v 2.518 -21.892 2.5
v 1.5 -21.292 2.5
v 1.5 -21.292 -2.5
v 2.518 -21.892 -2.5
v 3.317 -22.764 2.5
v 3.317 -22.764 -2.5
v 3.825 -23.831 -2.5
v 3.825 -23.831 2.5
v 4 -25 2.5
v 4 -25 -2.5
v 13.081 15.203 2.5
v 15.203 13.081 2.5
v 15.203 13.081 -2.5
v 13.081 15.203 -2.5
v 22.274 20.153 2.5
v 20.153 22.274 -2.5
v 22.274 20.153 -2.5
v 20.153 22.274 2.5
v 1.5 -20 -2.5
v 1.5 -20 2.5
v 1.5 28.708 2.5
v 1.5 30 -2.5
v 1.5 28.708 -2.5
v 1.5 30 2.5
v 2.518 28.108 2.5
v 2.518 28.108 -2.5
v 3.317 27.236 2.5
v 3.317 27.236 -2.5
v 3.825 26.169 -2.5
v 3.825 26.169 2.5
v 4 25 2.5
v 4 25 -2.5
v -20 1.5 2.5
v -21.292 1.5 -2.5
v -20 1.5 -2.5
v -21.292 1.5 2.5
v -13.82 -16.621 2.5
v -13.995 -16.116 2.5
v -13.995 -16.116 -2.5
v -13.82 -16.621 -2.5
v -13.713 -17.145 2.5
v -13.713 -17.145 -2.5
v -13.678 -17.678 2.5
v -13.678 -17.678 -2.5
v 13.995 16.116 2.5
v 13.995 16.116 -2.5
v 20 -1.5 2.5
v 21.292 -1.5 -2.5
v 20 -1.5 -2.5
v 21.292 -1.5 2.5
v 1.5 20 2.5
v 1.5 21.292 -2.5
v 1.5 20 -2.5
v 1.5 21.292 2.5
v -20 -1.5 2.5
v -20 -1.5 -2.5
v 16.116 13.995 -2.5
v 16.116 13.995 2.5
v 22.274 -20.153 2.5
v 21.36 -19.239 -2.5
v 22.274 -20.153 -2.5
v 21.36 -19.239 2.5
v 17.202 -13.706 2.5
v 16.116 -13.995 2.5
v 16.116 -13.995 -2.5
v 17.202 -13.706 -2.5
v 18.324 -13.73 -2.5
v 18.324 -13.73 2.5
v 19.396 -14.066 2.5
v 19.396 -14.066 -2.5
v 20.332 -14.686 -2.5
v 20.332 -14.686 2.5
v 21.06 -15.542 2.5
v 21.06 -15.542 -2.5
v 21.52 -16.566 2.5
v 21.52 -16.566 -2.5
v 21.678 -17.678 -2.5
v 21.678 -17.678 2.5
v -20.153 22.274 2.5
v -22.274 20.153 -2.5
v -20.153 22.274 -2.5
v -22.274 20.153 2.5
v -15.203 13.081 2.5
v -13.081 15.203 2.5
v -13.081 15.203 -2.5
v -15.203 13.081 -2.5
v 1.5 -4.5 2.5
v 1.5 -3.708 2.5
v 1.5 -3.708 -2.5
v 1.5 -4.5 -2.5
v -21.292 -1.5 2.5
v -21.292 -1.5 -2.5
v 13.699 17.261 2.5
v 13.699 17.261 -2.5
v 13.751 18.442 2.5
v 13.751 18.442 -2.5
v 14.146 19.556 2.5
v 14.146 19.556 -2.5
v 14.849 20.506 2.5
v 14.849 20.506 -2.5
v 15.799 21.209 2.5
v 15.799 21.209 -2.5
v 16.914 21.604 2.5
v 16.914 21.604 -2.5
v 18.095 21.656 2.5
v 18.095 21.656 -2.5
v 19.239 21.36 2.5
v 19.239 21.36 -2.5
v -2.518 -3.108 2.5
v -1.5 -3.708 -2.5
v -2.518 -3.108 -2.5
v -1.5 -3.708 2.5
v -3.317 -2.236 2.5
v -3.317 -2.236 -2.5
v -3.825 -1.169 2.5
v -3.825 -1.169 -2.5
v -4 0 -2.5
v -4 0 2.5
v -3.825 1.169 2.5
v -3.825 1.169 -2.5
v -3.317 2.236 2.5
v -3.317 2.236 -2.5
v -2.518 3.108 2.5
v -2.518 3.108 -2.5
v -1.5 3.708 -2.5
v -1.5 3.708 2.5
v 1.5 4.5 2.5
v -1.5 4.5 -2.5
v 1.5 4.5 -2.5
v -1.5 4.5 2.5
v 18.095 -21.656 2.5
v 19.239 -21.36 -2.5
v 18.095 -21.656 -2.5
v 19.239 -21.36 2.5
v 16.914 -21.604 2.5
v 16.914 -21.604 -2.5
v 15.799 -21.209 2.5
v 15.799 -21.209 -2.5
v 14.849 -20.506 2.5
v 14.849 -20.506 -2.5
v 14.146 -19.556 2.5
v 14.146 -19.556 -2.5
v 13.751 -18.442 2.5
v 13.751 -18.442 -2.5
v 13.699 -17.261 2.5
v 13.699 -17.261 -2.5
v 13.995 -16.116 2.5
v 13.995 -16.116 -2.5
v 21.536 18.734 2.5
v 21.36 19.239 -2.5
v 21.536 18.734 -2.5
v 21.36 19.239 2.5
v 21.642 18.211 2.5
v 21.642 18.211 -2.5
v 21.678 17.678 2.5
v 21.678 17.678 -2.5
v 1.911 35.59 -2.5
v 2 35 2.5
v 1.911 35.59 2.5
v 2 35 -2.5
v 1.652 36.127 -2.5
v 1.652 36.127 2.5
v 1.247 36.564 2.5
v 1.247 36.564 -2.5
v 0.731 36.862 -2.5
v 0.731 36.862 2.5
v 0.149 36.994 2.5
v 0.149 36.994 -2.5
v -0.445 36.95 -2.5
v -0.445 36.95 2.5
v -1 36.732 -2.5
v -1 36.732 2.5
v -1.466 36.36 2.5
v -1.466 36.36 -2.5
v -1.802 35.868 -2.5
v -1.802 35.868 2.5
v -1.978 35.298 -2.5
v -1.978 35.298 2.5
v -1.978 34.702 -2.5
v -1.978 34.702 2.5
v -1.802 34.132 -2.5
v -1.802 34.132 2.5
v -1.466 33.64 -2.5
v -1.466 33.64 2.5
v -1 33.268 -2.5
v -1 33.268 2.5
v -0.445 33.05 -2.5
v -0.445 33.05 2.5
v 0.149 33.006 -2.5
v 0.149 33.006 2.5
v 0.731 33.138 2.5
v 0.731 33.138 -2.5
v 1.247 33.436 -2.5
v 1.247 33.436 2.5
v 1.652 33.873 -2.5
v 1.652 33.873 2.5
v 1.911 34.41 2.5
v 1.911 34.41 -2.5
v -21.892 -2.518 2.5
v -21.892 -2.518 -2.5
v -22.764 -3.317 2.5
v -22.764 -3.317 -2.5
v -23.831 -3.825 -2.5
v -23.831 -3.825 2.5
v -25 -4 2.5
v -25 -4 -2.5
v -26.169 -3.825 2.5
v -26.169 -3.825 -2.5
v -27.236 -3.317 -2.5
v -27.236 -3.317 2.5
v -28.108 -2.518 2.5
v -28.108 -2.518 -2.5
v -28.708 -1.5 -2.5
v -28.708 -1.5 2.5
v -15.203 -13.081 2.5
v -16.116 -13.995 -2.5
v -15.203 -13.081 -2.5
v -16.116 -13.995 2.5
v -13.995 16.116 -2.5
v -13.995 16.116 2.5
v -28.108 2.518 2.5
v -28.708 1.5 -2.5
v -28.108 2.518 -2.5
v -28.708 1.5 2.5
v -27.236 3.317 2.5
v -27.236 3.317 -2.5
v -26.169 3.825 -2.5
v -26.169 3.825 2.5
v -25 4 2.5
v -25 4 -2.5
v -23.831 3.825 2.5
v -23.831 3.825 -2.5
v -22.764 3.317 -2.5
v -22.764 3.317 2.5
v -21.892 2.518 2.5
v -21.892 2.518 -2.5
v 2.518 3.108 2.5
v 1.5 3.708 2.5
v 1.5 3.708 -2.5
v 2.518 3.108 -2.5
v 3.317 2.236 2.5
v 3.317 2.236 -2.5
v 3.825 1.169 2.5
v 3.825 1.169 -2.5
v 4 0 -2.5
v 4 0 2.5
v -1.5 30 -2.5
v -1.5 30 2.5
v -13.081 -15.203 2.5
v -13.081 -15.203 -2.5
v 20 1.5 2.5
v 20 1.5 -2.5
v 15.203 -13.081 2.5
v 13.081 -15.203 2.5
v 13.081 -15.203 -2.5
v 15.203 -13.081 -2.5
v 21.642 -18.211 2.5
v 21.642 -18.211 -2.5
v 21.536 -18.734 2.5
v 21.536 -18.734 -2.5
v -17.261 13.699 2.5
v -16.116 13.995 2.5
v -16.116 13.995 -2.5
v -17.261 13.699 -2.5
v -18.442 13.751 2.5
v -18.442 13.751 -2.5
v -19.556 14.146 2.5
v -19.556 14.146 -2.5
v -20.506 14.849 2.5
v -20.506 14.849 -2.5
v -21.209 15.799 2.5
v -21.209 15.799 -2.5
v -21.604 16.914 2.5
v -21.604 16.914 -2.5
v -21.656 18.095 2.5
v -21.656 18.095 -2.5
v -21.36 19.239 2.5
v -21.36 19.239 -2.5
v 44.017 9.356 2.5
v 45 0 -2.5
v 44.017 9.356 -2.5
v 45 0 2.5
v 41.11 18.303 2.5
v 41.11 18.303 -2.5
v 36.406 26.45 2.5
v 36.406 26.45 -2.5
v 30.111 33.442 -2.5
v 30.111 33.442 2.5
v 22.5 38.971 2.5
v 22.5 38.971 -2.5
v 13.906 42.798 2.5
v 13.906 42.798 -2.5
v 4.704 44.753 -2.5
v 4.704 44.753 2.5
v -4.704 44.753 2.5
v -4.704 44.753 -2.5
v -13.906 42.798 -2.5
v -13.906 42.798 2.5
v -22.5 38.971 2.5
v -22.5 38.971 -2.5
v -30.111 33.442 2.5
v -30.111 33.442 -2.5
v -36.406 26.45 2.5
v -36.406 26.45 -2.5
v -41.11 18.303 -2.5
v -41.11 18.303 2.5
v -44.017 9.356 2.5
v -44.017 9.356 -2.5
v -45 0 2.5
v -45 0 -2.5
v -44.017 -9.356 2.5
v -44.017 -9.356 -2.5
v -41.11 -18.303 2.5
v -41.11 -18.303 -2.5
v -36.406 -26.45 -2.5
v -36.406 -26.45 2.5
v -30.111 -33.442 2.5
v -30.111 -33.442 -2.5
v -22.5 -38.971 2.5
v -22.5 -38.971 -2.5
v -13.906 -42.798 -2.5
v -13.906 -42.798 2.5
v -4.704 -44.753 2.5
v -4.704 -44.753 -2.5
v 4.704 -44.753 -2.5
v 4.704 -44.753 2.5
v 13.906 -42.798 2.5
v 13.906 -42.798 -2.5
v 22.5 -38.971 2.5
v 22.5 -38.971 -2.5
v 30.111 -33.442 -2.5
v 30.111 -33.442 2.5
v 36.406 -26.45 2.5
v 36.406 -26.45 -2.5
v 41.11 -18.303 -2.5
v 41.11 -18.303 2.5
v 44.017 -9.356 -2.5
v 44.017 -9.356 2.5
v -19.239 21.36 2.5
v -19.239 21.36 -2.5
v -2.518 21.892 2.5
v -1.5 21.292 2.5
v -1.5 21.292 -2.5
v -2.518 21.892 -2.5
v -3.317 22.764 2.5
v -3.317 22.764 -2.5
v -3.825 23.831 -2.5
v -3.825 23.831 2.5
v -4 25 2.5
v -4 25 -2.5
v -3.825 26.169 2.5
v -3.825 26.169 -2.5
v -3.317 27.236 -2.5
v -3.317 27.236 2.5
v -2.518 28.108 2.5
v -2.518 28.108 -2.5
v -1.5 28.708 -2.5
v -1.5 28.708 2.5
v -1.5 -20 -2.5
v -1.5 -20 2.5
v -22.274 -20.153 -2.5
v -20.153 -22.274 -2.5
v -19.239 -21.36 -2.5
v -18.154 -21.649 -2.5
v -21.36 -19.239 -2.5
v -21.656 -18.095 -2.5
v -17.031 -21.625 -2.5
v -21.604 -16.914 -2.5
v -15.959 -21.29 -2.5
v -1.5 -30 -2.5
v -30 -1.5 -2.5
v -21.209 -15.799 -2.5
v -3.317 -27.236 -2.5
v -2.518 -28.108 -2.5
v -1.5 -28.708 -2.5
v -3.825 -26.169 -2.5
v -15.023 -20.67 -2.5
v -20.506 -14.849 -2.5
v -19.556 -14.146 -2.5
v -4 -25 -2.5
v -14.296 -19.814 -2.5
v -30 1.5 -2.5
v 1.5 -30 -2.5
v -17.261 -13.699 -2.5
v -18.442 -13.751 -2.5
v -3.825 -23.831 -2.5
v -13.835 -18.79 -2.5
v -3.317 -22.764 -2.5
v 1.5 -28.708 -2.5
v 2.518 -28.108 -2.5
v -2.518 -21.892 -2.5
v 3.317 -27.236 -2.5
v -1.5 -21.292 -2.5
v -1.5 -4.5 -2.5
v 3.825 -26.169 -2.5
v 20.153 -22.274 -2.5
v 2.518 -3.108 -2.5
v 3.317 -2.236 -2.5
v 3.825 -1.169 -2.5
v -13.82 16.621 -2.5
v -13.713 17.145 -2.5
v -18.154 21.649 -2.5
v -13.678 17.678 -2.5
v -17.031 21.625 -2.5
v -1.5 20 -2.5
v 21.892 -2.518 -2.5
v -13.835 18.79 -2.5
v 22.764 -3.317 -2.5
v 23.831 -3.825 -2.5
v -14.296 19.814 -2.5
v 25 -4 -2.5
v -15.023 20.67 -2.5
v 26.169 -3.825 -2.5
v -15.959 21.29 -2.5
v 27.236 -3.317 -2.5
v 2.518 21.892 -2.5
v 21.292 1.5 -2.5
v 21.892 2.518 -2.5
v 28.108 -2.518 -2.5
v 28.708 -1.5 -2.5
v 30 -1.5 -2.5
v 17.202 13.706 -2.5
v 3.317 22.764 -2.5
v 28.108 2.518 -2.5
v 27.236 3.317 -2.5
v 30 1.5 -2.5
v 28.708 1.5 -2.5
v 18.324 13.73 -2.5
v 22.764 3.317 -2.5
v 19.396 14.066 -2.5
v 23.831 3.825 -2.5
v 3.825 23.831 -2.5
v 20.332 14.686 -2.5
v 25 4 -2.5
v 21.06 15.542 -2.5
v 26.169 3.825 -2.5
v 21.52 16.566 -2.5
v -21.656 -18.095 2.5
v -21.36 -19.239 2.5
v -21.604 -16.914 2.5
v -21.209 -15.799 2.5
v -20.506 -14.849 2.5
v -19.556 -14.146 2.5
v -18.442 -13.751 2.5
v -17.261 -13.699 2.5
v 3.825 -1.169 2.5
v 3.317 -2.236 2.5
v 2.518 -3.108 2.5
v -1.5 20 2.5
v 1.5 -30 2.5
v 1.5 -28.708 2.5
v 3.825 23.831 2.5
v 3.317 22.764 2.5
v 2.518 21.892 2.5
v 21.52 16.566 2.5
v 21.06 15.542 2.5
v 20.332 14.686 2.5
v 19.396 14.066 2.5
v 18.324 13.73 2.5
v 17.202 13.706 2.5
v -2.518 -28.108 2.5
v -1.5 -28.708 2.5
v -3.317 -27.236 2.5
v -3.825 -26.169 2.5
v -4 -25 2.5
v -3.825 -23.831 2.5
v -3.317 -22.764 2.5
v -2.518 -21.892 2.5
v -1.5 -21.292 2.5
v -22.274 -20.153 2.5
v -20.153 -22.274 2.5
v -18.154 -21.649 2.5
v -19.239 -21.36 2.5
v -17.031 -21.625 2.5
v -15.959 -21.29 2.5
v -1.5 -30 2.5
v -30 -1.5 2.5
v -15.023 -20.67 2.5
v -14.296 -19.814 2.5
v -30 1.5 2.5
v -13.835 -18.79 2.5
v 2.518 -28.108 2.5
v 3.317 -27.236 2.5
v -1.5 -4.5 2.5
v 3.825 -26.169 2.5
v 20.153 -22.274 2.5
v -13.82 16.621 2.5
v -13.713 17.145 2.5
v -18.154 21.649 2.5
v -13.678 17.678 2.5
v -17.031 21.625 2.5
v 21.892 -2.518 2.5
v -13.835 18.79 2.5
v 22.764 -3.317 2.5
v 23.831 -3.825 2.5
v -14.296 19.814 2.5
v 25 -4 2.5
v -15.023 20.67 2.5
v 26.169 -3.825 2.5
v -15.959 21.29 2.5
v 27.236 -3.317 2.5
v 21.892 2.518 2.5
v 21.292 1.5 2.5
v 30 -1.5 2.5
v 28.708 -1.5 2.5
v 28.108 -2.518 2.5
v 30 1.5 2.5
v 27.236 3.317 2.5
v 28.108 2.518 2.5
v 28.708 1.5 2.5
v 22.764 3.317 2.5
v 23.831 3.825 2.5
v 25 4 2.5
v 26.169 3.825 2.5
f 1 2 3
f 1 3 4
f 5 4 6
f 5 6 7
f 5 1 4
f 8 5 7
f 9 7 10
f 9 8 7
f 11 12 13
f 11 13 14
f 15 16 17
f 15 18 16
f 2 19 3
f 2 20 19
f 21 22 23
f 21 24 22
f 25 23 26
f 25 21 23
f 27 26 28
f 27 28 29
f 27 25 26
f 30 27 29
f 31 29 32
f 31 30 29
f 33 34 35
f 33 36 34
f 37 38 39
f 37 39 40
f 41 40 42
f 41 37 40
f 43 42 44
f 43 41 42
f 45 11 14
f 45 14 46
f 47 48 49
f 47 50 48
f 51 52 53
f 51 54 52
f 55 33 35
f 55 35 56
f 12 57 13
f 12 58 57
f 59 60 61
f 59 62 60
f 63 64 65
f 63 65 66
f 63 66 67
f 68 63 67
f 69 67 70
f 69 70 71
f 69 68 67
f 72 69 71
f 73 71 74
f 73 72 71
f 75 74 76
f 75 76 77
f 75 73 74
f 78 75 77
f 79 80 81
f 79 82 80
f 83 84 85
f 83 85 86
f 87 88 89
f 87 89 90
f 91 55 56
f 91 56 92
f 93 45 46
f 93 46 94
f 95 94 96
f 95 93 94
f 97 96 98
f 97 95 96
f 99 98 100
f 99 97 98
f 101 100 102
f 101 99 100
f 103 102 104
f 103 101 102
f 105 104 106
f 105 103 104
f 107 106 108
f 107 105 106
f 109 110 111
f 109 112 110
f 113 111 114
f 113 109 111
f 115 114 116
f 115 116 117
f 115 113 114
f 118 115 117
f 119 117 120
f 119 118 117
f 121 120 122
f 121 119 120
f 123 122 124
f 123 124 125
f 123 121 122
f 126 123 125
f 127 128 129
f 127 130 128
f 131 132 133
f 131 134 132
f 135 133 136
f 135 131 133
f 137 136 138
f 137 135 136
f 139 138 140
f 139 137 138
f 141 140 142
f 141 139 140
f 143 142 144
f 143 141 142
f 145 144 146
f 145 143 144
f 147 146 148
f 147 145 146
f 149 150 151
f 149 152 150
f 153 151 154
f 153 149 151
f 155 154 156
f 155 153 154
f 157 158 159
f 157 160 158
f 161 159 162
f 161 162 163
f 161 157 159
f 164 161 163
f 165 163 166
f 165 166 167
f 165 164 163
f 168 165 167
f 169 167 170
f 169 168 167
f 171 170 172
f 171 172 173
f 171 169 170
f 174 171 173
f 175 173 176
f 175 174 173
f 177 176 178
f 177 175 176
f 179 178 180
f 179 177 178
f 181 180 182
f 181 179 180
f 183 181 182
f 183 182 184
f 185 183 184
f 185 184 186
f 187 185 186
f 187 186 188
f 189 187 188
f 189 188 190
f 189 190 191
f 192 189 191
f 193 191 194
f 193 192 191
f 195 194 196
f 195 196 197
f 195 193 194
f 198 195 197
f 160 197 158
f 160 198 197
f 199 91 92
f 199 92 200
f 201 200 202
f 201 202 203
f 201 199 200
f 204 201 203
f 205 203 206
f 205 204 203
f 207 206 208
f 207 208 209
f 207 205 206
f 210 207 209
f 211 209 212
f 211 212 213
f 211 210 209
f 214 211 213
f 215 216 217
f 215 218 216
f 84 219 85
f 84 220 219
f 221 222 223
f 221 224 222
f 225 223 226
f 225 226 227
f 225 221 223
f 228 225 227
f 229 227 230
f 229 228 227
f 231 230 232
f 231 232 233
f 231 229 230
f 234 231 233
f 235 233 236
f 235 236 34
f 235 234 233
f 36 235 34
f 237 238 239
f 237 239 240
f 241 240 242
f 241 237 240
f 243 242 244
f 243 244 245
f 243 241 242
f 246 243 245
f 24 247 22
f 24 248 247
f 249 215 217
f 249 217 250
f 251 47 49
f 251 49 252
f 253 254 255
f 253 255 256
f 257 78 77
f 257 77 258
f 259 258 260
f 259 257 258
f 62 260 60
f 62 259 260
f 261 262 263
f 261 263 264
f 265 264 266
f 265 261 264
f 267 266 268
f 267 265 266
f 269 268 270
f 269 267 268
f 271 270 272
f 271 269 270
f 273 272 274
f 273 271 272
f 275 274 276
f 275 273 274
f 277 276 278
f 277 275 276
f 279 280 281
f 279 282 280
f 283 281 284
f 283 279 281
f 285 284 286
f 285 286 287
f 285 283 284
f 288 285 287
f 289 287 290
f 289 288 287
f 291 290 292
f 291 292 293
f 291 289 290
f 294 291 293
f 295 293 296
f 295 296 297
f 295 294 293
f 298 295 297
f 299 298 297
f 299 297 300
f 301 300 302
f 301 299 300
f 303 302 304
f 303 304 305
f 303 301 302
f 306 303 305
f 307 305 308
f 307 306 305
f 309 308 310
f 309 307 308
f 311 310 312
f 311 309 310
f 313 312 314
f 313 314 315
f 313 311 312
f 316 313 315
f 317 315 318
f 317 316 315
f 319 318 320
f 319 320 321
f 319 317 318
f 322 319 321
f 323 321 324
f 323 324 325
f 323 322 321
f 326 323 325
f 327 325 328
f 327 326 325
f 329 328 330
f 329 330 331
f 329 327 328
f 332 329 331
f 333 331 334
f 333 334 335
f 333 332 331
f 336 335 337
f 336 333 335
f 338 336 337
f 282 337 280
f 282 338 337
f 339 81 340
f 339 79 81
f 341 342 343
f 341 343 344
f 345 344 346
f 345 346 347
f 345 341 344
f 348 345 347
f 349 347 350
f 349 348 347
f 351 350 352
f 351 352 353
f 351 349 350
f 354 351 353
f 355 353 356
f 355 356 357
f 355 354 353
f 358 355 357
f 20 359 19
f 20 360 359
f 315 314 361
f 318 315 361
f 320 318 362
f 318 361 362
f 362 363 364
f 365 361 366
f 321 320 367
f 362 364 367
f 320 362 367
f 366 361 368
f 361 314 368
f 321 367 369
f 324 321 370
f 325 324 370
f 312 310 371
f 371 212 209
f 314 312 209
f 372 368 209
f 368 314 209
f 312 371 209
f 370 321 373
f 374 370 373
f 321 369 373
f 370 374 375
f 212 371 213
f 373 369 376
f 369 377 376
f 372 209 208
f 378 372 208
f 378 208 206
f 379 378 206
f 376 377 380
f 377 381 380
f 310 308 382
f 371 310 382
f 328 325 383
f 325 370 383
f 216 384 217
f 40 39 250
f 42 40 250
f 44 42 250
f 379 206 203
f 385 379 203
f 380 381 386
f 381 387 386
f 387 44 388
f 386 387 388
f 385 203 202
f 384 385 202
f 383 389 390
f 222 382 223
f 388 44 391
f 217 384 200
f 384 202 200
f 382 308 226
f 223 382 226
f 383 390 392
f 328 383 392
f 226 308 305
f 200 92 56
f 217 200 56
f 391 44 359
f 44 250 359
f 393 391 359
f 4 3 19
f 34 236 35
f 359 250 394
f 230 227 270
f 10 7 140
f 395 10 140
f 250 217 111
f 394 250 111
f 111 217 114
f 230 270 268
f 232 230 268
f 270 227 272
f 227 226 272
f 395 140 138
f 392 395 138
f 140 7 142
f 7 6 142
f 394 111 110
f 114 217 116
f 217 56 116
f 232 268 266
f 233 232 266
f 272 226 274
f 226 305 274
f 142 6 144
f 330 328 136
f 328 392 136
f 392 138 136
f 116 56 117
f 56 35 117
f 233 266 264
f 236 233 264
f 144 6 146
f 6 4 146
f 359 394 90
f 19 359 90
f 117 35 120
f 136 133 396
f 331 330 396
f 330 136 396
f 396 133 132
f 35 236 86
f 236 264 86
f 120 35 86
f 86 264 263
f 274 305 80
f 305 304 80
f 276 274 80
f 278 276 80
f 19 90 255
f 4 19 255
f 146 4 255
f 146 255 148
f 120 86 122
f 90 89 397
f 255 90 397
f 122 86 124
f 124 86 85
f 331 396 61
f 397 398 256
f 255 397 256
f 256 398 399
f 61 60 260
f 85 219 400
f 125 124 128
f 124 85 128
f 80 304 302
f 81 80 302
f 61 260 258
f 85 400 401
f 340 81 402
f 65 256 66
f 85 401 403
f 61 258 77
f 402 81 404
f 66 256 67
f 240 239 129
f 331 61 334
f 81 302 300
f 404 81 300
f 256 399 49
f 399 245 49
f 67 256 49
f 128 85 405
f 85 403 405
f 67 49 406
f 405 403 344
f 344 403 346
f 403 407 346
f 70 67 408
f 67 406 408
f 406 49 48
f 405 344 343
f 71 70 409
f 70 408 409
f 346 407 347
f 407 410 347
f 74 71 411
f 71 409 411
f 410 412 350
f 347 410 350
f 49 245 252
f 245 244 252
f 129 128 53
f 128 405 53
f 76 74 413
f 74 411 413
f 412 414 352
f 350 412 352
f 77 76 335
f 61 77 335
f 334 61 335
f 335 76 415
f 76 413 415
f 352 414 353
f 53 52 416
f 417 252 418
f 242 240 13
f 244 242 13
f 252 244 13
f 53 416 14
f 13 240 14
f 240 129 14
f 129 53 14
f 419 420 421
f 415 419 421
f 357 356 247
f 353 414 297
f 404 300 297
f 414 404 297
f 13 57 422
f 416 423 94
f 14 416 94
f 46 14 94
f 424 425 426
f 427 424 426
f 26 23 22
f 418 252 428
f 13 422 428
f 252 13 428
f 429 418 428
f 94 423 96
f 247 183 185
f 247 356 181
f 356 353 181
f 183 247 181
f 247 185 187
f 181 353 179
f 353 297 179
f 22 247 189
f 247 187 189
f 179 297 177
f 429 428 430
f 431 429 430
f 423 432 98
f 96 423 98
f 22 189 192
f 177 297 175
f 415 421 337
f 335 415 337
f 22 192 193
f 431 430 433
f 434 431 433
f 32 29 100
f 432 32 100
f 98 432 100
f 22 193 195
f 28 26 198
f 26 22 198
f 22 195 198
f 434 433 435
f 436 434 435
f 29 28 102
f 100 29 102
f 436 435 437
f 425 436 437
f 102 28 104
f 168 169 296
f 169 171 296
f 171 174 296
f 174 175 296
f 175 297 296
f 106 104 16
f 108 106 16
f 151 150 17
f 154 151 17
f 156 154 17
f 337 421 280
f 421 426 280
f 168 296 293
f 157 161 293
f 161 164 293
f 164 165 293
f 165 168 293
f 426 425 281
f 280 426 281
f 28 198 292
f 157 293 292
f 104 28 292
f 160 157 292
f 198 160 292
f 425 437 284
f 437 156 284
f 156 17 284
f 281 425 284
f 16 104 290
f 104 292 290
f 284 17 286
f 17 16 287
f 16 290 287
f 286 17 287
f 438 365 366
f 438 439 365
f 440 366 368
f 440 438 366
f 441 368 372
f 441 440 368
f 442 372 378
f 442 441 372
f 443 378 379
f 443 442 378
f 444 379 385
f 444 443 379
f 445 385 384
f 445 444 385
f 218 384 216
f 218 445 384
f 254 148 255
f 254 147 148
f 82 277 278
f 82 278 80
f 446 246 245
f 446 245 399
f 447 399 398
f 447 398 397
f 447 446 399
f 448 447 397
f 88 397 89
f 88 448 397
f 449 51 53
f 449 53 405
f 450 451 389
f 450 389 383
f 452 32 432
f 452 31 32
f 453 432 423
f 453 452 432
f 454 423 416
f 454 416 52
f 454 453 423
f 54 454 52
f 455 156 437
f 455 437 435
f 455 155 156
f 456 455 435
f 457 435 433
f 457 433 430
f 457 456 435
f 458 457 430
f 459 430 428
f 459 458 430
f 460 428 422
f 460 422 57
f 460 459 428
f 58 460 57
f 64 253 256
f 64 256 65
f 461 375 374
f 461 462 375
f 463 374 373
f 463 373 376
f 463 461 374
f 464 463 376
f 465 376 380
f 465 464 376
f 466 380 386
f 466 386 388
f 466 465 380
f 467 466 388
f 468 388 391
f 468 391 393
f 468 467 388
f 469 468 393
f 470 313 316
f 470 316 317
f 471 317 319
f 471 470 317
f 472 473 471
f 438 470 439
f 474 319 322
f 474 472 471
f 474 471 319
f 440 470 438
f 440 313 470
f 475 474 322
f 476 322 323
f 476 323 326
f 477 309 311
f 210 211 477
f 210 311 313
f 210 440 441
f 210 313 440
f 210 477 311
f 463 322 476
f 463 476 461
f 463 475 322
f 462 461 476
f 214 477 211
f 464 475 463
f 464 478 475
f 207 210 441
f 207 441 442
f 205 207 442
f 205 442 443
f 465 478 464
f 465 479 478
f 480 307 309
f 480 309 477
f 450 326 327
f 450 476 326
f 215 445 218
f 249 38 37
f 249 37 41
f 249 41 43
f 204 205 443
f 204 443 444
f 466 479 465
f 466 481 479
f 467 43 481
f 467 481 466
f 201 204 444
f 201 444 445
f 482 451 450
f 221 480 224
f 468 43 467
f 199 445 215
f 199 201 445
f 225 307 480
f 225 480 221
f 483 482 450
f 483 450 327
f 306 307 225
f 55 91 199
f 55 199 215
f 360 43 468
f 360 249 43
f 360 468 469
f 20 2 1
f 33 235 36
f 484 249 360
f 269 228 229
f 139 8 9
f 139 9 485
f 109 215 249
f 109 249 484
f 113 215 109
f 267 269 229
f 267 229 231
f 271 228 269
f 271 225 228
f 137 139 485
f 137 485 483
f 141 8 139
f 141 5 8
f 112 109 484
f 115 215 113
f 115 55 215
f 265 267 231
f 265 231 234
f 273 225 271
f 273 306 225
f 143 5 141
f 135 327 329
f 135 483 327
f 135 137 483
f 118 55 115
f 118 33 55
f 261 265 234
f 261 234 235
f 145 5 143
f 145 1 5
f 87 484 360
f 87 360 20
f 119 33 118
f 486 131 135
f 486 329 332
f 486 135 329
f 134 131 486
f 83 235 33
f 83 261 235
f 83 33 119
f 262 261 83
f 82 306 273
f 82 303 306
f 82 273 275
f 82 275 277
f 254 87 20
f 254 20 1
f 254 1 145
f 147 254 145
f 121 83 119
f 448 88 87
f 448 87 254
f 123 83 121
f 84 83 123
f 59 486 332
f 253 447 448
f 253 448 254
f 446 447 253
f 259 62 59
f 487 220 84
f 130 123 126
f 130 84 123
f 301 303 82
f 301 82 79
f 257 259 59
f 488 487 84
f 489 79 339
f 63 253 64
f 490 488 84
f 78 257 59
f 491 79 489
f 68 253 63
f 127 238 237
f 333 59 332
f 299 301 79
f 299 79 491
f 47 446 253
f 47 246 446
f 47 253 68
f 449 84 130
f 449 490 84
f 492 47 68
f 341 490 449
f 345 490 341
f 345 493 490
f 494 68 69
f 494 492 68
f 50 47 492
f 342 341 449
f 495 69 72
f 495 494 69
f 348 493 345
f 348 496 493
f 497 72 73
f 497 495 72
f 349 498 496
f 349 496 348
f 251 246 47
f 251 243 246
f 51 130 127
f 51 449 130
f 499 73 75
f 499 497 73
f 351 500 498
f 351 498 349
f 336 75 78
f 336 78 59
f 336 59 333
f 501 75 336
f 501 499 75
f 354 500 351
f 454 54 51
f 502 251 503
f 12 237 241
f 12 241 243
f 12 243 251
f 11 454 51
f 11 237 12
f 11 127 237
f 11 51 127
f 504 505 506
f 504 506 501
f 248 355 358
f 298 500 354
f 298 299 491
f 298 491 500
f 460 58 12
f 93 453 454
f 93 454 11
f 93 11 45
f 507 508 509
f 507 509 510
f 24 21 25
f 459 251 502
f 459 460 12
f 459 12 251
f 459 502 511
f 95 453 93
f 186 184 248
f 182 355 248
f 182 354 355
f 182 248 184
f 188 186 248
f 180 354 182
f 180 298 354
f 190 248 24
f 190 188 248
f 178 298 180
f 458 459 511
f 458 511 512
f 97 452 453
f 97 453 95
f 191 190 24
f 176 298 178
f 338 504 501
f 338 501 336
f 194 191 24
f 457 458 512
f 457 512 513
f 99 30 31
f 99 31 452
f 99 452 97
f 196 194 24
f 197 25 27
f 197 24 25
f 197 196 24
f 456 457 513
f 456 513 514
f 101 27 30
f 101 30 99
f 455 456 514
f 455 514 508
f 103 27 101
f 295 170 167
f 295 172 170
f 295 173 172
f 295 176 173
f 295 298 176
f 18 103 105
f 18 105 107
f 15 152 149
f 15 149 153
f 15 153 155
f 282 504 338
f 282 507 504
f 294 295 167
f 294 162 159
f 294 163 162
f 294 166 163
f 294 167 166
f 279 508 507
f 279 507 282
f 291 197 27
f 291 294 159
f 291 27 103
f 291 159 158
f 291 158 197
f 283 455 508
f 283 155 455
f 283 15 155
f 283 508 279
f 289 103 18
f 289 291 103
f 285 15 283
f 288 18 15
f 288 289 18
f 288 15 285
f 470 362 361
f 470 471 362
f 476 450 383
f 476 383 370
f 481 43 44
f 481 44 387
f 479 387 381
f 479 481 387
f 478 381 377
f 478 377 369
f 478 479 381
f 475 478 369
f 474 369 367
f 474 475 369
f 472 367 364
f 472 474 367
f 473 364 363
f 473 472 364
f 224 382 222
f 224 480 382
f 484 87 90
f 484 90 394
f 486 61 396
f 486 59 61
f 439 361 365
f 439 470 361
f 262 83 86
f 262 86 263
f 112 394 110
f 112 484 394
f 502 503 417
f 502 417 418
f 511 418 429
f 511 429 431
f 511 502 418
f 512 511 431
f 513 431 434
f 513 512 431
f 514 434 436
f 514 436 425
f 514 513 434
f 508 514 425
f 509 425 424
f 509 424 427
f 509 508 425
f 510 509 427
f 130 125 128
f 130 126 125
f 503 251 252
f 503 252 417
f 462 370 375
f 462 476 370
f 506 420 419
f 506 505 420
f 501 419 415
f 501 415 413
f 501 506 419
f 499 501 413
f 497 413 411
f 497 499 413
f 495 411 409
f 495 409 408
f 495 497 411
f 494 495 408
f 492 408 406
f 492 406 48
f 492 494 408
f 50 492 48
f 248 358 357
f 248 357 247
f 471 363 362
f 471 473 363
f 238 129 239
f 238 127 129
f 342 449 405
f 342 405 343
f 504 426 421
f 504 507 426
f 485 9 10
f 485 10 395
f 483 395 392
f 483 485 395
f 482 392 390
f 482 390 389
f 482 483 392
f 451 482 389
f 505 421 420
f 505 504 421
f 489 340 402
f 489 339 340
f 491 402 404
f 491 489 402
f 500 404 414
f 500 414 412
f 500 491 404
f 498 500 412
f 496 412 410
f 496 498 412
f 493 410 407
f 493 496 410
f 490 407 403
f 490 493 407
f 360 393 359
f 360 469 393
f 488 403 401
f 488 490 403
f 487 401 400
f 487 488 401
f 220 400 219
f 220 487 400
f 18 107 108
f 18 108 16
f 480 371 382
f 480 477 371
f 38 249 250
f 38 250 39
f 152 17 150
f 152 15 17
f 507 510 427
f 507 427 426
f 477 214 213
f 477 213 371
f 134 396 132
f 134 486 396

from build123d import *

# Parameters (mm, degrees)
F0_R     = 45
F0_R_2   = 2
F1_DEPTH = 2.5


with BuildPart() as f1:
    # F0 (on Top) → F1 (new body, symmetric)
    with BuildSketch(Plane.XY):
        Circle(F0_R)
        with BuildLine():
            Line((-15.202796, -13.081475), (-13.081475, -15.202796))
            Line((-13.081475, -15.202796), (-13.994987, -16.116308))
            ThreePointArc((-13.994987, -16.116308), (-13.757802, -16.881029), (-13.67767, -17.67767))
            ThreePointArc((-13.67767, -17.67767), (-15.469214, -21.012744), (-19.239031, -21.360352))
            Line((-19.239031, -21.360352), (-20.152543, -22.273864))
            Line((-20.152543, -22.273864), (-22.273864, -20.152543))
            Line((-22.273864, -20.152543), (-21.360352, -19.239031))
            ThreePointArc((-21.360352, -19.239031), (-20.506097, -14.849242), (-16.116308, -13.994987))
            Line((-16.116308, -13.994987), (-15.202796, -13.081475))
        make_face(mode=Mode.SUBTRACT)
        with BuildLine():
            ThreePointArc((1.5, -21.291901), (3.316625, -22.763932), (4, -25))
            ThreePointArc((4, -25), (3.316625, -27.236068), (1.5, -28.708099))
            Line((1.5, -28.708099), (1.5, -30))
            Line((1.5, -30), (-1.5, -30))
            Line((-1.5, -30), (-1.5, -28.708099))
            ThreePointArc((-1.5, -28.708099), (-4, -25), (-1.5, -21.291901))
            Line((-1.5, -21.291901), (-1.5, -20))
            Line((-1.5, -20), (1.5, -20))
            Line((1.5, -20), (1.5, -21.291901))
        make_face(mode=Mode.SUBTRACT)
        with BuildLine():
            Line((13.081475, -15.202796), (15.202796, -13.081475))
            Line((15.202796, -13.081475), (16.116308, -13.994987))
            ThreePointArc((16.116308, -13.994987), (19.886125, -14.342595), (21.67767, -17.67767))
            ThreePointArc((21.67767, -17.67767), (21.597537, -18.47431), (21.360352, -19.239031))
            Line((21.360352, -19.239031), (22.273864, -20.152543))
            Line((22.273864, -20.152543), (20.152543, -22.273864))
            Line((20.152543, -22.273864), (19.239031, -21.360352))
            ThreePointArc((19.239031, -21.360352), (14.849242, -20.506097), (13.994987, -16.116308))
            Line((13.994987, -16.116308), (13.081475, -15.202796))
        make_face(mode=Mode.SUBTRACT)
        with BuildLine():
            Line((-20, 1.5), (-20, -1.5))
            Line((-20, -1.5), (-21.291901, -1.5))
            ThreePointArc((-21.291901, -1.5), (-25, -4), (-28.708099, -1.5))
            Line((-28.708099, -1.5), (-30, -1.5))
            Line((-30, -1.5), (-30, 1.5))
            Line((-30, 1.5), (-28.708099, 1.5))
            ThreePointArc((-28.708099, 1.5), (-25, 4), (-21.291901, 1.5))
            Line((-21.291901, 1.5), (-20, 1.5))
        make_face(mode=Mode.SUBTRACT)
        with BuildLine():
            Line((-13.081475, 15.202796), (-15.202796, 13.081475))
            Line((-15.202796, 13.081475), (-16.116308, 13.994987))
            ThreePointArc((-16.116308, 13.994987), (-20.506097, 14.849242), (-21.360352, 19.239031))
            Line((-21.360352, 19.239031), (-22.273864, 20.152543))
            Line((-22.273864, 20.152543), (-20.152543, 22.273864))
            Line((-20.152543, 22.273864), (-19.239031, 21.360352))
            ThreePointArc((-19.239031, 21.360352), (-15.469214, 21.012744), (-13.67767, 17.67767))
            ThreePointArc((-13.67767, 17.67767), (-13.757802, 16.881029), (-13.994987, 16.116308))
            Line((-13.994987, 16.116308), (-13.081475, 15.202796))
        make_face(mode=Mode.SUBTRACT)
        with BuildLine():
            ThreePointArc((1.5, 3.708099), (3.316625, 2.236068), (4, 0))
            ThreePointArc((4, 0), (3.316625, -2.236068), (1.5, -3.708099))
            Line((1.5, -3.708099), (1.5, -4.5))
            Line((1.5, -4.5), (-1.5, -4.5))
            Line((-1.5, -4.5), (-1.5, -3.708099))
            ThreePointArc((-1.5, -3.708099), (-4, 0), (-1.5, 3.708099))
            Line((-1.5, 3.708099), (-1.5, 4.5))
            Line((-1.5, 4.5), (1.5, 4.5))
            Line((1.5, 4.5), (1.5, 3.708099))
        make_face(mode=Mode.SUBTRACT)
        with BuildLine():
            Line((15.202796, 13.081475), (13.081475, 15.202796))
            Line((13.081475, 15.202796), (13.994987, 16.116308))
            ThreePointArc((13.994987, 16.116308), (14.849242, 20.506097), (19.239031, 21.360352))
            Line((19.239031, 21.360352), (20.152543, 22.273864))
            Line((20.152543, 22.273864), (22.273864, 20.152543))
            Line((22.273864, 20.152543), (21.360352, 19.239031))
            ThreePointArc((21.360352, 19.239031), (21.597537, 18.47431), (21.67767, 17.67767))
            ThreePointArc((21.67767, 17.67767), (19.886125, 14.342595), (16.116308, 13.994987))
            Line((16.116308, 13.994987), (15.202796, 13.081475))
        make_face(mode=Mode.SUBTRACT)
        with BuildLine():
            Line((20, -1.5), (20, 1.5))
            Line((20, 1.5), (21.291901, 1.5))
            ThreePointArc((21.291901, 1.5), (25, 4), (28.708099, 1.5))
            Line((28.708099, 1.5), (30, 1.5))
            Line((30, 1.5), (30, -1.5))
            Line((30, -1.5), (28.708099, -1.5))
            ThreePointArc((28.708099, -1.5), (25, -4), (21.291901, -1.5))
            Line((21.291901, -1.5), (20, -1.5))
        make_face(mode=Mode.SUBTRACT)
        with BuildLine():
            Line((1.5, 20), (-1.5, 20))
            Line((-1.5, 20), (-1.5, 21.291901))
            ThreePointArc((-1.5, 21.291901), (-4, 25), (-1.5, 28.708099))
            Line((-1.5, 28.708099), (-1.5, 30))
            Line((-1.5, 30), (1.5, 30))
            Line((1.5, 30), (1.5, 28.708099))
            ThreePointArc((1.5, 28.708099), (3.316625, 27.236068), (4, 25))
            ThreePointArc((4, 25), (3.316625, 22.763932), (1.5, 21.291901))
            Line((1.5, 21.291901), (1.5, 20))
        make_face(mode=Mode.SUBTRACT)
        with Locations((0, 35)):
            Circle(F0_R_2, mode=Mode.SUBTRACT)
    extrude(amount=F1_DEPTH, both=True)


solid = f1.part
